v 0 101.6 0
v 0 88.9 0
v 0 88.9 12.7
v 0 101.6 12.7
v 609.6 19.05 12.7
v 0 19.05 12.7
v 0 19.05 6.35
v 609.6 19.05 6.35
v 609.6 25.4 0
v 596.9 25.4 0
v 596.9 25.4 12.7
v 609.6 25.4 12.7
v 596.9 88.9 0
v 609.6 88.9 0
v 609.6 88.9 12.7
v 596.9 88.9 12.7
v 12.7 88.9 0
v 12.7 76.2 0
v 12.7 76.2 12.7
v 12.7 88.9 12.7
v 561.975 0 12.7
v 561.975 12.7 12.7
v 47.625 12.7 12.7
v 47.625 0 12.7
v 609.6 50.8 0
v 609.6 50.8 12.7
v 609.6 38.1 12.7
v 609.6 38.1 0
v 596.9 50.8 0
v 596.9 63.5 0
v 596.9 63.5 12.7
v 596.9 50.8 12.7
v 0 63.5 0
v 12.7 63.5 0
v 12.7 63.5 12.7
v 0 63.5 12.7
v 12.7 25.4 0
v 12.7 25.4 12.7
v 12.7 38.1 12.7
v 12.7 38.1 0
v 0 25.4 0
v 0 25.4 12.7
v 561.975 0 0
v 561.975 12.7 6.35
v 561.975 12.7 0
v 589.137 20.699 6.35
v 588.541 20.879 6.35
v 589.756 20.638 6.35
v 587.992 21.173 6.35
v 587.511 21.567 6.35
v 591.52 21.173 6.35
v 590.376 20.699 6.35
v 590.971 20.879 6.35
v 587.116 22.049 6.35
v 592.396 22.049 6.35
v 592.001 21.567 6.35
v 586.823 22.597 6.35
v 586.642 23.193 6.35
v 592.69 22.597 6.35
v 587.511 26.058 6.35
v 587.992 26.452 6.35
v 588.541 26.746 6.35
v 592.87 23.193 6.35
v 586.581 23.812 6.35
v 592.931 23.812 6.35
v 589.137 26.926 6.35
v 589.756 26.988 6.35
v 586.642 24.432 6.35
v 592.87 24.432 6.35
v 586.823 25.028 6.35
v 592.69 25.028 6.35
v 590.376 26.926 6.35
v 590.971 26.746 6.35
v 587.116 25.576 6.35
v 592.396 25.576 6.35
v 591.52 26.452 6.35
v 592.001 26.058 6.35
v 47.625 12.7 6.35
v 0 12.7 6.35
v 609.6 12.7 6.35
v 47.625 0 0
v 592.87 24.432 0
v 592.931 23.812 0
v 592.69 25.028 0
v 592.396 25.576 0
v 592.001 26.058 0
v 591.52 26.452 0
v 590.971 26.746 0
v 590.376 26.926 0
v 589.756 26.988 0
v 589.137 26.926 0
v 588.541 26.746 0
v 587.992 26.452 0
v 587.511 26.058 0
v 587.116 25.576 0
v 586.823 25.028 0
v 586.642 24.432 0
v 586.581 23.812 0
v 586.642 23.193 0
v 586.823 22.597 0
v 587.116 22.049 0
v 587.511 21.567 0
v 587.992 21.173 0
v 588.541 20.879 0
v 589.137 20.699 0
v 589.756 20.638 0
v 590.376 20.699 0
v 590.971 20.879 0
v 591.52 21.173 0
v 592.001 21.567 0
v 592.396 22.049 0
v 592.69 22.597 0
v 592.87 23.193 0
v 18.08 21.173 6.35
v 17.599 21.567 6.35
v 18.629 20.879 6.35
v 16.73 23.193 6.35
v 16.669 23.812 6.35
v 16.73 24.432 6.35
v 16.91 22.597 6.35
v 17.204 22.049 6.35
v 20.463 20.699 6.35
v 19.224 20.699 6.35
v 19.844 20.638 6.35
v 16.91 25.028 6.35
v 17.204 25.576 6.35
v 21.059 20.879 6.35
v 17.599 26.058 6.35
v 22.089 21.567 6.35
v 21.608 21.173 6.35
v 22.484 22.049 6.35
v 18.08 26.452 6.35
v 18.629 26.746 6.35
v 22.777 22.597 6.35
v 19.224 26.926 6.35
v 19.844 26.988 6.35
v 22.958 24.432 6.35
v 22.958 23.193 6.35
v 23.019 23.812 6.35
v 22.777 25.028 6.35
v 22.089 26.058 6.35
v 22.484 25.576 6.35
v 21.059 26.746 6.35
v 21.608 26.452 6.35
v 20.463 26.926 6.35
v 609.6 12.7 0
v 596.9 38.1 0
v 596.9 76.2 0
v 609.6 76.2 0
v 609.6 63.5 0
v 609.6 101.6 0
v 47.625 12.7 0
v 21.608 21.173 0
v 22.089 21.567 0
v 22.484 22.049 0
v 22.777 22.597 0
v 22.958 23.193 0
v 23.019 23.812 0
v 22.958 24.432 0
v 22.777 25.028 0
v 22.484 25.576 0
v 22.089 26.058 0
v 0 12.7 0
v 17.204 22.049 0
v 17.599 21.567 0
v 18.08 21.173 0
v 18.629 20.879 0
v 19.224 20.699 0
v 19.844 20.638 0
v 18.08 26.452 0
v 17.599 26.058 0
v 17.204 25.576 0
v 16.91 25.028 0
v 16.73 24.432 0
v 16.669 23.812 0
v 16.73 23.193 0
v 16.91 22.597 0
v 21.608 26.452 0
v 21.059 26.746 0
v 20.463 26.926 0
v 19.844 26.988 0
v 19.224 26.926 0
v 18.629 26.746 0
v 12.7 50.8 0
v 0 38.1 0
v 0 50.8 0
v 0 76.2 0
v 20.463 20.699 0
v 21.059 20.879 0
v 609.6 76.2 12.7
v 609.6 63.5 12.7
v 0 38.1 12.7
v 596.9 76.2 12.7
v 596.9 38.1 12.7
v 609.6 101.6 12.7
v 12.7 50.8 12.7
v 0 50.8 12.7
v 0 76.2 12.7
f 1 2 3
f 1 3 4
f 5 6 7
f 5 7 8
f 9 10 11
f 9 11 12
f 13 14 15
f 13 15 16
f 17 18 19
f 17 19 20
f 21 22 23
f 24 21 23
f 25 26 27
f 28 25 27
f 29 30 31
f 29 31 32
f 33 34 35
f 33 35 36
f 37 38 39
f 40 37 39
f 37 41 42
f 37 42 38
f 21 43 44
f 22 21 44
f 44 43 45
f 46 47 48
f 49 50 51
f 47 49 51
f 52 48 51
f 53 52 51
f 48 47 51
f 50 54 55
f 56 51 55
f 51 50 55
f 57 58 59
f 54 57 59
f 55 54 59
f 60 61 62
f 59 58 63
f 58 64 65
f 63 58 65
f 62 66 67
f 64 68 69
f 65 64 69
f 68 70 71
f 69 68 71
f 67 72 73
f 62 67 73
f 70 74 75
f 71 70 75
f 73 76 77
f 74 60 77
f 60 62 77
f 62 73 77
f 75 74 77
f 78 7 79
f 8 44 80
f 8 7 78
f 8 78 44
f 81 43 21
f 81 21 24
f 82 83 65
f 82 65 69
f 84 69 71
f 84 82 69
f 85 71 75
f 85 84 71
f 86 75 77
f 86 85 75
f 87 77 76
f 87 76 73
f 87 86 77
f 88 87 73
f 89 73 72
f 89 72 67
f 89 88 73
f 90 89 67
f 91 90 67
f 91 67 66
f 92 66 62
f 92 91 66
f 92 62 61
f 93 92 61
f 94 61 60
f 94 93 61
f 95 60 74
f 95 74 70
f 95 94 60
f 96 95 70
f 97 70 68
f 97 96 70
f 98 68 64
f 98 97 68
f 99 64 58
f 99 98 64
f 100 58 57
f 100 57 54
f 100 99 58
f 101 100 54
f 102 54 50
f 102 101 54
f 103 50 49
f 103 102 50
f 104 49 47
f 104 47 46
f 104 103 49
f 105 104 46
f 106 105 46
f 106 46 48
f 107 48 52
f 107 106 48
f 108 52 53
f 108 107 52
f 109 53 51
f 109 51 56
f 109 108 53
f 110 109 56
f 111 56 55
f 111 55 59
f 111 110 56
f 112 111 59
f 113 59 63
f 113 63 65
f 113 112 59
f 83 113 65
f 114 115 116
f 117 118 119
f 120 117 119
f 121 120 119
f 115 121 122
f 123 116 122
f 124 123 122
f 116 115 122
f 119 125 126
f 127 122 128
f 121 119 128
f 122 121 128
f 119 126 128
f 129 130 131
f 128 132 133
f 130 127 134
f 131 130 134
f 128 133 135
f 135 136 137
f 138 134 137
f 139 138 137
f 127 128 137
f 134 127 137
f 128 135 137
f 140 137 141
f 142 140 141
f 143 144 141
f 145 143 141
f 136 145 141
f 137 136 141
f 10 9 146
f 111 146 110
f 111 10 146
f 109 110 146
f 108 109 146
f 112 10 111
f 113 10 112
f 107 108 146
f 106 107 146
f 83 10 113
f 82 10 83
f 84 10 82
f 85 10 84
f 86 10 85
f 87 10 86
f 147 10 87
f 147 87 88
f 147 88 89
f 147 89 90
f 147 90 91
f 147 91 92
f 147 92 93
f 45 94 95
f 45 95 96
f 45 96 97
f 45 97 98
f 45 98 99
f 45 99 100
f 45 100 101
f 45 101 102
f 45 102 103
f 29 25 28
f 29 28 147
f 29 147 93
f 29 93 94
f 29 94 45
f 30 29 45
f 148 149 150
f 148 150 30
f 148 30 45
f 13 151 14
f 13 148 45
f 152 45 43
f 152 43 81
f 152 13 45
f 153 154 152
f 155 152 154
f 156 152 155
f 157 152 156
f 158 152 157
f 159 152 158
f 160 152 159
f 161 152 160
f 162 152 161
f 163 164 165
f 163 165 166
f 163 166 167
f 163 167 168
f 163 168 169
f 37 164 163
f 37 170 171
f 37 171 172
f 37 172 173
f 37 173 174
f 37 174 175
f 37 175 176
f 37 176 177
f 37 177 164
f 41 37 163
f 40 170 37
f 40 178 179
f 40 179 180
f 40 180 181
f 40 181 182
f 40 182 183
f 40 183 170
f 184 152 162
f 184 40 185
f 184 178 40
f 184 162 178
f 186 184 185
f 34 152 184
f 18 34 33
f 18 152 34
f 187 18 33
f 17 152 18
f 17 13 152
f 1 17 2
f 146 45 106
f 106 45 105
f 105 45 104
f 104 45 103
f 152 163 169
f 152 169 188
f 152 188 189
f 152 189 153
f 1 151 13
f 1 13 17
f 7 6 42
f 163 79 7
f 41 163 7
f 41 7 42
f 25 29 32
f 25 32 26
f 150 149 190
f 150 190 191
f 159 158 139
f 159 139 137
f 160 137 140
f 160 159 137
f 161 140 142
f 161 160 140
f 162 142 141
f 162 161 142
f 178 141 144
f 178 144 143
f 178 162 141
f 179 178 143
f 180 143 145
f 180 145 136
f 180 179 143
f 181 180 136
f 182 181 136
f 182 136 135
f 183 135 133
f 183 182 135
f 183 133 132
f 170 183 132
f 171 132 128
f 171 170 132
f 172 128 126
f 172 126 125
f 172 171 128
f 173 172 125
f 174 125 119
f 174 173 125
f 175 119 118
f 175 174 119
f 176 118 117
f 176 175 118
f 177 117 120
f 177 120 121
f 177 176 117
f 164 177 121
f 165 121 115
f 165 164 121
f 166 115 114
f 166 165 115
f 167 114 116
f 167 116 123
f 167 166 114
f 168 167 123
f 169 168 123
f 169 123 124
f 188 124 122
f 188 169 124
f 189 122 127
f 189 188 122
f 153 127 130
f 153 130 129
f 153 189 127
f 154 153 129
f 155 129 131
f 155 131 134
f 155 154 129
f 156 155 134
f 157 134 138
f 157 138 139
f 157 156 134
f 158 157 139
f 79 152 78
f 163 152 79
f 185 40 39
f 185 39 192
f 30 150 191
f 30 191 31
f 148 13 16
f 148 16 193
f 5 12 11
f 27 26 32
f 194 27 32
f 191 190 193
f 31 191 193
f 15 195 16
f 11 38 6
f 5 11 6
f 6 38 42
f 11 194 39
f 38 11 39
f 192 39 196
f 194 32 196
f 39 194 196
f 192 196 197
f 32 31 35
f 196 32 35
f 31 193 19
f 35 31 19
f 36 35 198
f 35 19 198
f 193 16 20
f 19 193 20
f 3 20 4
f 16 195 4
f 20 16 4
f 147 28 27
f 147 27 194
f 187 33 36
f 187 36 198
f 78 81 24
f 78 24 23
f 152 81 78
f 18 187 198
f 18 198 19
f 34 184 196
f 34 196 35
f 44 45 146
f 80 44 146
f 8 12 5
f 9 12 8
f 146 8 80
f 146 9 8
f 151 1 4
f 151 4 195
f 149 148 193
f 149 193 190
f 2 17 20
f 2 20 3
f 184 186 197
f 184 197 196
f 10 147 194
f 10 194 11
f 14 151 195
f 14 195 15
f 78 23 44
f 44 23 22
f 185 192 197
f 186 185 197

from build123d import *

# Parameters (mm, degrees)
BOSS_EXTRUDE1_DEPTH = 12.7
SKETCH2_W           = 34.925
SKETCH2_H           = 12.7
CUT_EXTRUDE1_DEPTH  = 619.139151001
SKETCH2_4_R         = 3.175
CUT_EXTRUDE2_DEPTH  = 6.35
SKETCH3_W           = 679.915177356
SKETCH3_H           = 6.35
CUT_EXTRUDE3_DEPTH  = 6.35


with BuildPart() as part:
    # Sketch1 → Boss-Extrude1 (new body)
    with BuildSketch(Plane.XY):
        Polygon((0, 25.4), (0, 12.7), (12.7, 12.7), (12.7, 0), (596.9, 0), (596.9, 12.7), (609.6, 12.7), (609.6, 25.4), (596.9, 25.4), (596.9, 38.1), (609.6, 38.1), (609.6, 50.8), (596.9, 50.8), (596.9, 63.5), (609.6, 63.5), (609.6, 76.2), (596.9, 76.2), (596.9, 88.9), (609.6, 88.9), (609.6, 101.6), (0, 101.6), (0, 88.9), (12.7, 88.9), (12.7, 76.2), (0, 76.2), (0, 63.5), (12.7, 63.5), (12.7, 50.8), (0, 50.8), (0, 38.1), (12.7, 38.1), (12.7, 25.4), align=None)
    extrude(amount=BOSS_EXTRUDE1_DEPTH)

    # Sketch2 → Cut-Extrude1 (cut, through all)
    with BuildSketch(Plane.XY):
        with Locations((579.4375, 6.35)):
            Rectangle(SKETCH2_W, SKETCH2_H)
        with Locations((30.1625, 6.35)):
            Rectangle(SKETCH2_W, SKETCH2_H)
    extrude(amount=CUT_EXTRUDE1_DEPTH, mode=Mode.SUBTRACT)

    # Sketch2<4> → Cut-Extrude2 (cut)
    with BuildSketch(Plane.XY):
        with Locations((589.75625, 23.8125)):
            Circle(SKETCH2_4_R)
        with Locations((19.84375, 23.8125)):
            Circle(SKETCH2_4_R)
    extrude(amount=CUT_EXTRUDE2_DEPTH, mode=Mode.SUBTRACT)

    # Sketch3 → Cut-Extrude3 (cut)
    with BuildSketch(Plane.XY.offset(12.7)):
        with Locations((325.163434952, 15.875)):
            Rectangle(SKETCH3_W, SKETCH3_H)
    extrude(amount=-CUT_EXTRUDE3_DEPTH, mode=Mode.SUBTRACT)


solid = part.part
